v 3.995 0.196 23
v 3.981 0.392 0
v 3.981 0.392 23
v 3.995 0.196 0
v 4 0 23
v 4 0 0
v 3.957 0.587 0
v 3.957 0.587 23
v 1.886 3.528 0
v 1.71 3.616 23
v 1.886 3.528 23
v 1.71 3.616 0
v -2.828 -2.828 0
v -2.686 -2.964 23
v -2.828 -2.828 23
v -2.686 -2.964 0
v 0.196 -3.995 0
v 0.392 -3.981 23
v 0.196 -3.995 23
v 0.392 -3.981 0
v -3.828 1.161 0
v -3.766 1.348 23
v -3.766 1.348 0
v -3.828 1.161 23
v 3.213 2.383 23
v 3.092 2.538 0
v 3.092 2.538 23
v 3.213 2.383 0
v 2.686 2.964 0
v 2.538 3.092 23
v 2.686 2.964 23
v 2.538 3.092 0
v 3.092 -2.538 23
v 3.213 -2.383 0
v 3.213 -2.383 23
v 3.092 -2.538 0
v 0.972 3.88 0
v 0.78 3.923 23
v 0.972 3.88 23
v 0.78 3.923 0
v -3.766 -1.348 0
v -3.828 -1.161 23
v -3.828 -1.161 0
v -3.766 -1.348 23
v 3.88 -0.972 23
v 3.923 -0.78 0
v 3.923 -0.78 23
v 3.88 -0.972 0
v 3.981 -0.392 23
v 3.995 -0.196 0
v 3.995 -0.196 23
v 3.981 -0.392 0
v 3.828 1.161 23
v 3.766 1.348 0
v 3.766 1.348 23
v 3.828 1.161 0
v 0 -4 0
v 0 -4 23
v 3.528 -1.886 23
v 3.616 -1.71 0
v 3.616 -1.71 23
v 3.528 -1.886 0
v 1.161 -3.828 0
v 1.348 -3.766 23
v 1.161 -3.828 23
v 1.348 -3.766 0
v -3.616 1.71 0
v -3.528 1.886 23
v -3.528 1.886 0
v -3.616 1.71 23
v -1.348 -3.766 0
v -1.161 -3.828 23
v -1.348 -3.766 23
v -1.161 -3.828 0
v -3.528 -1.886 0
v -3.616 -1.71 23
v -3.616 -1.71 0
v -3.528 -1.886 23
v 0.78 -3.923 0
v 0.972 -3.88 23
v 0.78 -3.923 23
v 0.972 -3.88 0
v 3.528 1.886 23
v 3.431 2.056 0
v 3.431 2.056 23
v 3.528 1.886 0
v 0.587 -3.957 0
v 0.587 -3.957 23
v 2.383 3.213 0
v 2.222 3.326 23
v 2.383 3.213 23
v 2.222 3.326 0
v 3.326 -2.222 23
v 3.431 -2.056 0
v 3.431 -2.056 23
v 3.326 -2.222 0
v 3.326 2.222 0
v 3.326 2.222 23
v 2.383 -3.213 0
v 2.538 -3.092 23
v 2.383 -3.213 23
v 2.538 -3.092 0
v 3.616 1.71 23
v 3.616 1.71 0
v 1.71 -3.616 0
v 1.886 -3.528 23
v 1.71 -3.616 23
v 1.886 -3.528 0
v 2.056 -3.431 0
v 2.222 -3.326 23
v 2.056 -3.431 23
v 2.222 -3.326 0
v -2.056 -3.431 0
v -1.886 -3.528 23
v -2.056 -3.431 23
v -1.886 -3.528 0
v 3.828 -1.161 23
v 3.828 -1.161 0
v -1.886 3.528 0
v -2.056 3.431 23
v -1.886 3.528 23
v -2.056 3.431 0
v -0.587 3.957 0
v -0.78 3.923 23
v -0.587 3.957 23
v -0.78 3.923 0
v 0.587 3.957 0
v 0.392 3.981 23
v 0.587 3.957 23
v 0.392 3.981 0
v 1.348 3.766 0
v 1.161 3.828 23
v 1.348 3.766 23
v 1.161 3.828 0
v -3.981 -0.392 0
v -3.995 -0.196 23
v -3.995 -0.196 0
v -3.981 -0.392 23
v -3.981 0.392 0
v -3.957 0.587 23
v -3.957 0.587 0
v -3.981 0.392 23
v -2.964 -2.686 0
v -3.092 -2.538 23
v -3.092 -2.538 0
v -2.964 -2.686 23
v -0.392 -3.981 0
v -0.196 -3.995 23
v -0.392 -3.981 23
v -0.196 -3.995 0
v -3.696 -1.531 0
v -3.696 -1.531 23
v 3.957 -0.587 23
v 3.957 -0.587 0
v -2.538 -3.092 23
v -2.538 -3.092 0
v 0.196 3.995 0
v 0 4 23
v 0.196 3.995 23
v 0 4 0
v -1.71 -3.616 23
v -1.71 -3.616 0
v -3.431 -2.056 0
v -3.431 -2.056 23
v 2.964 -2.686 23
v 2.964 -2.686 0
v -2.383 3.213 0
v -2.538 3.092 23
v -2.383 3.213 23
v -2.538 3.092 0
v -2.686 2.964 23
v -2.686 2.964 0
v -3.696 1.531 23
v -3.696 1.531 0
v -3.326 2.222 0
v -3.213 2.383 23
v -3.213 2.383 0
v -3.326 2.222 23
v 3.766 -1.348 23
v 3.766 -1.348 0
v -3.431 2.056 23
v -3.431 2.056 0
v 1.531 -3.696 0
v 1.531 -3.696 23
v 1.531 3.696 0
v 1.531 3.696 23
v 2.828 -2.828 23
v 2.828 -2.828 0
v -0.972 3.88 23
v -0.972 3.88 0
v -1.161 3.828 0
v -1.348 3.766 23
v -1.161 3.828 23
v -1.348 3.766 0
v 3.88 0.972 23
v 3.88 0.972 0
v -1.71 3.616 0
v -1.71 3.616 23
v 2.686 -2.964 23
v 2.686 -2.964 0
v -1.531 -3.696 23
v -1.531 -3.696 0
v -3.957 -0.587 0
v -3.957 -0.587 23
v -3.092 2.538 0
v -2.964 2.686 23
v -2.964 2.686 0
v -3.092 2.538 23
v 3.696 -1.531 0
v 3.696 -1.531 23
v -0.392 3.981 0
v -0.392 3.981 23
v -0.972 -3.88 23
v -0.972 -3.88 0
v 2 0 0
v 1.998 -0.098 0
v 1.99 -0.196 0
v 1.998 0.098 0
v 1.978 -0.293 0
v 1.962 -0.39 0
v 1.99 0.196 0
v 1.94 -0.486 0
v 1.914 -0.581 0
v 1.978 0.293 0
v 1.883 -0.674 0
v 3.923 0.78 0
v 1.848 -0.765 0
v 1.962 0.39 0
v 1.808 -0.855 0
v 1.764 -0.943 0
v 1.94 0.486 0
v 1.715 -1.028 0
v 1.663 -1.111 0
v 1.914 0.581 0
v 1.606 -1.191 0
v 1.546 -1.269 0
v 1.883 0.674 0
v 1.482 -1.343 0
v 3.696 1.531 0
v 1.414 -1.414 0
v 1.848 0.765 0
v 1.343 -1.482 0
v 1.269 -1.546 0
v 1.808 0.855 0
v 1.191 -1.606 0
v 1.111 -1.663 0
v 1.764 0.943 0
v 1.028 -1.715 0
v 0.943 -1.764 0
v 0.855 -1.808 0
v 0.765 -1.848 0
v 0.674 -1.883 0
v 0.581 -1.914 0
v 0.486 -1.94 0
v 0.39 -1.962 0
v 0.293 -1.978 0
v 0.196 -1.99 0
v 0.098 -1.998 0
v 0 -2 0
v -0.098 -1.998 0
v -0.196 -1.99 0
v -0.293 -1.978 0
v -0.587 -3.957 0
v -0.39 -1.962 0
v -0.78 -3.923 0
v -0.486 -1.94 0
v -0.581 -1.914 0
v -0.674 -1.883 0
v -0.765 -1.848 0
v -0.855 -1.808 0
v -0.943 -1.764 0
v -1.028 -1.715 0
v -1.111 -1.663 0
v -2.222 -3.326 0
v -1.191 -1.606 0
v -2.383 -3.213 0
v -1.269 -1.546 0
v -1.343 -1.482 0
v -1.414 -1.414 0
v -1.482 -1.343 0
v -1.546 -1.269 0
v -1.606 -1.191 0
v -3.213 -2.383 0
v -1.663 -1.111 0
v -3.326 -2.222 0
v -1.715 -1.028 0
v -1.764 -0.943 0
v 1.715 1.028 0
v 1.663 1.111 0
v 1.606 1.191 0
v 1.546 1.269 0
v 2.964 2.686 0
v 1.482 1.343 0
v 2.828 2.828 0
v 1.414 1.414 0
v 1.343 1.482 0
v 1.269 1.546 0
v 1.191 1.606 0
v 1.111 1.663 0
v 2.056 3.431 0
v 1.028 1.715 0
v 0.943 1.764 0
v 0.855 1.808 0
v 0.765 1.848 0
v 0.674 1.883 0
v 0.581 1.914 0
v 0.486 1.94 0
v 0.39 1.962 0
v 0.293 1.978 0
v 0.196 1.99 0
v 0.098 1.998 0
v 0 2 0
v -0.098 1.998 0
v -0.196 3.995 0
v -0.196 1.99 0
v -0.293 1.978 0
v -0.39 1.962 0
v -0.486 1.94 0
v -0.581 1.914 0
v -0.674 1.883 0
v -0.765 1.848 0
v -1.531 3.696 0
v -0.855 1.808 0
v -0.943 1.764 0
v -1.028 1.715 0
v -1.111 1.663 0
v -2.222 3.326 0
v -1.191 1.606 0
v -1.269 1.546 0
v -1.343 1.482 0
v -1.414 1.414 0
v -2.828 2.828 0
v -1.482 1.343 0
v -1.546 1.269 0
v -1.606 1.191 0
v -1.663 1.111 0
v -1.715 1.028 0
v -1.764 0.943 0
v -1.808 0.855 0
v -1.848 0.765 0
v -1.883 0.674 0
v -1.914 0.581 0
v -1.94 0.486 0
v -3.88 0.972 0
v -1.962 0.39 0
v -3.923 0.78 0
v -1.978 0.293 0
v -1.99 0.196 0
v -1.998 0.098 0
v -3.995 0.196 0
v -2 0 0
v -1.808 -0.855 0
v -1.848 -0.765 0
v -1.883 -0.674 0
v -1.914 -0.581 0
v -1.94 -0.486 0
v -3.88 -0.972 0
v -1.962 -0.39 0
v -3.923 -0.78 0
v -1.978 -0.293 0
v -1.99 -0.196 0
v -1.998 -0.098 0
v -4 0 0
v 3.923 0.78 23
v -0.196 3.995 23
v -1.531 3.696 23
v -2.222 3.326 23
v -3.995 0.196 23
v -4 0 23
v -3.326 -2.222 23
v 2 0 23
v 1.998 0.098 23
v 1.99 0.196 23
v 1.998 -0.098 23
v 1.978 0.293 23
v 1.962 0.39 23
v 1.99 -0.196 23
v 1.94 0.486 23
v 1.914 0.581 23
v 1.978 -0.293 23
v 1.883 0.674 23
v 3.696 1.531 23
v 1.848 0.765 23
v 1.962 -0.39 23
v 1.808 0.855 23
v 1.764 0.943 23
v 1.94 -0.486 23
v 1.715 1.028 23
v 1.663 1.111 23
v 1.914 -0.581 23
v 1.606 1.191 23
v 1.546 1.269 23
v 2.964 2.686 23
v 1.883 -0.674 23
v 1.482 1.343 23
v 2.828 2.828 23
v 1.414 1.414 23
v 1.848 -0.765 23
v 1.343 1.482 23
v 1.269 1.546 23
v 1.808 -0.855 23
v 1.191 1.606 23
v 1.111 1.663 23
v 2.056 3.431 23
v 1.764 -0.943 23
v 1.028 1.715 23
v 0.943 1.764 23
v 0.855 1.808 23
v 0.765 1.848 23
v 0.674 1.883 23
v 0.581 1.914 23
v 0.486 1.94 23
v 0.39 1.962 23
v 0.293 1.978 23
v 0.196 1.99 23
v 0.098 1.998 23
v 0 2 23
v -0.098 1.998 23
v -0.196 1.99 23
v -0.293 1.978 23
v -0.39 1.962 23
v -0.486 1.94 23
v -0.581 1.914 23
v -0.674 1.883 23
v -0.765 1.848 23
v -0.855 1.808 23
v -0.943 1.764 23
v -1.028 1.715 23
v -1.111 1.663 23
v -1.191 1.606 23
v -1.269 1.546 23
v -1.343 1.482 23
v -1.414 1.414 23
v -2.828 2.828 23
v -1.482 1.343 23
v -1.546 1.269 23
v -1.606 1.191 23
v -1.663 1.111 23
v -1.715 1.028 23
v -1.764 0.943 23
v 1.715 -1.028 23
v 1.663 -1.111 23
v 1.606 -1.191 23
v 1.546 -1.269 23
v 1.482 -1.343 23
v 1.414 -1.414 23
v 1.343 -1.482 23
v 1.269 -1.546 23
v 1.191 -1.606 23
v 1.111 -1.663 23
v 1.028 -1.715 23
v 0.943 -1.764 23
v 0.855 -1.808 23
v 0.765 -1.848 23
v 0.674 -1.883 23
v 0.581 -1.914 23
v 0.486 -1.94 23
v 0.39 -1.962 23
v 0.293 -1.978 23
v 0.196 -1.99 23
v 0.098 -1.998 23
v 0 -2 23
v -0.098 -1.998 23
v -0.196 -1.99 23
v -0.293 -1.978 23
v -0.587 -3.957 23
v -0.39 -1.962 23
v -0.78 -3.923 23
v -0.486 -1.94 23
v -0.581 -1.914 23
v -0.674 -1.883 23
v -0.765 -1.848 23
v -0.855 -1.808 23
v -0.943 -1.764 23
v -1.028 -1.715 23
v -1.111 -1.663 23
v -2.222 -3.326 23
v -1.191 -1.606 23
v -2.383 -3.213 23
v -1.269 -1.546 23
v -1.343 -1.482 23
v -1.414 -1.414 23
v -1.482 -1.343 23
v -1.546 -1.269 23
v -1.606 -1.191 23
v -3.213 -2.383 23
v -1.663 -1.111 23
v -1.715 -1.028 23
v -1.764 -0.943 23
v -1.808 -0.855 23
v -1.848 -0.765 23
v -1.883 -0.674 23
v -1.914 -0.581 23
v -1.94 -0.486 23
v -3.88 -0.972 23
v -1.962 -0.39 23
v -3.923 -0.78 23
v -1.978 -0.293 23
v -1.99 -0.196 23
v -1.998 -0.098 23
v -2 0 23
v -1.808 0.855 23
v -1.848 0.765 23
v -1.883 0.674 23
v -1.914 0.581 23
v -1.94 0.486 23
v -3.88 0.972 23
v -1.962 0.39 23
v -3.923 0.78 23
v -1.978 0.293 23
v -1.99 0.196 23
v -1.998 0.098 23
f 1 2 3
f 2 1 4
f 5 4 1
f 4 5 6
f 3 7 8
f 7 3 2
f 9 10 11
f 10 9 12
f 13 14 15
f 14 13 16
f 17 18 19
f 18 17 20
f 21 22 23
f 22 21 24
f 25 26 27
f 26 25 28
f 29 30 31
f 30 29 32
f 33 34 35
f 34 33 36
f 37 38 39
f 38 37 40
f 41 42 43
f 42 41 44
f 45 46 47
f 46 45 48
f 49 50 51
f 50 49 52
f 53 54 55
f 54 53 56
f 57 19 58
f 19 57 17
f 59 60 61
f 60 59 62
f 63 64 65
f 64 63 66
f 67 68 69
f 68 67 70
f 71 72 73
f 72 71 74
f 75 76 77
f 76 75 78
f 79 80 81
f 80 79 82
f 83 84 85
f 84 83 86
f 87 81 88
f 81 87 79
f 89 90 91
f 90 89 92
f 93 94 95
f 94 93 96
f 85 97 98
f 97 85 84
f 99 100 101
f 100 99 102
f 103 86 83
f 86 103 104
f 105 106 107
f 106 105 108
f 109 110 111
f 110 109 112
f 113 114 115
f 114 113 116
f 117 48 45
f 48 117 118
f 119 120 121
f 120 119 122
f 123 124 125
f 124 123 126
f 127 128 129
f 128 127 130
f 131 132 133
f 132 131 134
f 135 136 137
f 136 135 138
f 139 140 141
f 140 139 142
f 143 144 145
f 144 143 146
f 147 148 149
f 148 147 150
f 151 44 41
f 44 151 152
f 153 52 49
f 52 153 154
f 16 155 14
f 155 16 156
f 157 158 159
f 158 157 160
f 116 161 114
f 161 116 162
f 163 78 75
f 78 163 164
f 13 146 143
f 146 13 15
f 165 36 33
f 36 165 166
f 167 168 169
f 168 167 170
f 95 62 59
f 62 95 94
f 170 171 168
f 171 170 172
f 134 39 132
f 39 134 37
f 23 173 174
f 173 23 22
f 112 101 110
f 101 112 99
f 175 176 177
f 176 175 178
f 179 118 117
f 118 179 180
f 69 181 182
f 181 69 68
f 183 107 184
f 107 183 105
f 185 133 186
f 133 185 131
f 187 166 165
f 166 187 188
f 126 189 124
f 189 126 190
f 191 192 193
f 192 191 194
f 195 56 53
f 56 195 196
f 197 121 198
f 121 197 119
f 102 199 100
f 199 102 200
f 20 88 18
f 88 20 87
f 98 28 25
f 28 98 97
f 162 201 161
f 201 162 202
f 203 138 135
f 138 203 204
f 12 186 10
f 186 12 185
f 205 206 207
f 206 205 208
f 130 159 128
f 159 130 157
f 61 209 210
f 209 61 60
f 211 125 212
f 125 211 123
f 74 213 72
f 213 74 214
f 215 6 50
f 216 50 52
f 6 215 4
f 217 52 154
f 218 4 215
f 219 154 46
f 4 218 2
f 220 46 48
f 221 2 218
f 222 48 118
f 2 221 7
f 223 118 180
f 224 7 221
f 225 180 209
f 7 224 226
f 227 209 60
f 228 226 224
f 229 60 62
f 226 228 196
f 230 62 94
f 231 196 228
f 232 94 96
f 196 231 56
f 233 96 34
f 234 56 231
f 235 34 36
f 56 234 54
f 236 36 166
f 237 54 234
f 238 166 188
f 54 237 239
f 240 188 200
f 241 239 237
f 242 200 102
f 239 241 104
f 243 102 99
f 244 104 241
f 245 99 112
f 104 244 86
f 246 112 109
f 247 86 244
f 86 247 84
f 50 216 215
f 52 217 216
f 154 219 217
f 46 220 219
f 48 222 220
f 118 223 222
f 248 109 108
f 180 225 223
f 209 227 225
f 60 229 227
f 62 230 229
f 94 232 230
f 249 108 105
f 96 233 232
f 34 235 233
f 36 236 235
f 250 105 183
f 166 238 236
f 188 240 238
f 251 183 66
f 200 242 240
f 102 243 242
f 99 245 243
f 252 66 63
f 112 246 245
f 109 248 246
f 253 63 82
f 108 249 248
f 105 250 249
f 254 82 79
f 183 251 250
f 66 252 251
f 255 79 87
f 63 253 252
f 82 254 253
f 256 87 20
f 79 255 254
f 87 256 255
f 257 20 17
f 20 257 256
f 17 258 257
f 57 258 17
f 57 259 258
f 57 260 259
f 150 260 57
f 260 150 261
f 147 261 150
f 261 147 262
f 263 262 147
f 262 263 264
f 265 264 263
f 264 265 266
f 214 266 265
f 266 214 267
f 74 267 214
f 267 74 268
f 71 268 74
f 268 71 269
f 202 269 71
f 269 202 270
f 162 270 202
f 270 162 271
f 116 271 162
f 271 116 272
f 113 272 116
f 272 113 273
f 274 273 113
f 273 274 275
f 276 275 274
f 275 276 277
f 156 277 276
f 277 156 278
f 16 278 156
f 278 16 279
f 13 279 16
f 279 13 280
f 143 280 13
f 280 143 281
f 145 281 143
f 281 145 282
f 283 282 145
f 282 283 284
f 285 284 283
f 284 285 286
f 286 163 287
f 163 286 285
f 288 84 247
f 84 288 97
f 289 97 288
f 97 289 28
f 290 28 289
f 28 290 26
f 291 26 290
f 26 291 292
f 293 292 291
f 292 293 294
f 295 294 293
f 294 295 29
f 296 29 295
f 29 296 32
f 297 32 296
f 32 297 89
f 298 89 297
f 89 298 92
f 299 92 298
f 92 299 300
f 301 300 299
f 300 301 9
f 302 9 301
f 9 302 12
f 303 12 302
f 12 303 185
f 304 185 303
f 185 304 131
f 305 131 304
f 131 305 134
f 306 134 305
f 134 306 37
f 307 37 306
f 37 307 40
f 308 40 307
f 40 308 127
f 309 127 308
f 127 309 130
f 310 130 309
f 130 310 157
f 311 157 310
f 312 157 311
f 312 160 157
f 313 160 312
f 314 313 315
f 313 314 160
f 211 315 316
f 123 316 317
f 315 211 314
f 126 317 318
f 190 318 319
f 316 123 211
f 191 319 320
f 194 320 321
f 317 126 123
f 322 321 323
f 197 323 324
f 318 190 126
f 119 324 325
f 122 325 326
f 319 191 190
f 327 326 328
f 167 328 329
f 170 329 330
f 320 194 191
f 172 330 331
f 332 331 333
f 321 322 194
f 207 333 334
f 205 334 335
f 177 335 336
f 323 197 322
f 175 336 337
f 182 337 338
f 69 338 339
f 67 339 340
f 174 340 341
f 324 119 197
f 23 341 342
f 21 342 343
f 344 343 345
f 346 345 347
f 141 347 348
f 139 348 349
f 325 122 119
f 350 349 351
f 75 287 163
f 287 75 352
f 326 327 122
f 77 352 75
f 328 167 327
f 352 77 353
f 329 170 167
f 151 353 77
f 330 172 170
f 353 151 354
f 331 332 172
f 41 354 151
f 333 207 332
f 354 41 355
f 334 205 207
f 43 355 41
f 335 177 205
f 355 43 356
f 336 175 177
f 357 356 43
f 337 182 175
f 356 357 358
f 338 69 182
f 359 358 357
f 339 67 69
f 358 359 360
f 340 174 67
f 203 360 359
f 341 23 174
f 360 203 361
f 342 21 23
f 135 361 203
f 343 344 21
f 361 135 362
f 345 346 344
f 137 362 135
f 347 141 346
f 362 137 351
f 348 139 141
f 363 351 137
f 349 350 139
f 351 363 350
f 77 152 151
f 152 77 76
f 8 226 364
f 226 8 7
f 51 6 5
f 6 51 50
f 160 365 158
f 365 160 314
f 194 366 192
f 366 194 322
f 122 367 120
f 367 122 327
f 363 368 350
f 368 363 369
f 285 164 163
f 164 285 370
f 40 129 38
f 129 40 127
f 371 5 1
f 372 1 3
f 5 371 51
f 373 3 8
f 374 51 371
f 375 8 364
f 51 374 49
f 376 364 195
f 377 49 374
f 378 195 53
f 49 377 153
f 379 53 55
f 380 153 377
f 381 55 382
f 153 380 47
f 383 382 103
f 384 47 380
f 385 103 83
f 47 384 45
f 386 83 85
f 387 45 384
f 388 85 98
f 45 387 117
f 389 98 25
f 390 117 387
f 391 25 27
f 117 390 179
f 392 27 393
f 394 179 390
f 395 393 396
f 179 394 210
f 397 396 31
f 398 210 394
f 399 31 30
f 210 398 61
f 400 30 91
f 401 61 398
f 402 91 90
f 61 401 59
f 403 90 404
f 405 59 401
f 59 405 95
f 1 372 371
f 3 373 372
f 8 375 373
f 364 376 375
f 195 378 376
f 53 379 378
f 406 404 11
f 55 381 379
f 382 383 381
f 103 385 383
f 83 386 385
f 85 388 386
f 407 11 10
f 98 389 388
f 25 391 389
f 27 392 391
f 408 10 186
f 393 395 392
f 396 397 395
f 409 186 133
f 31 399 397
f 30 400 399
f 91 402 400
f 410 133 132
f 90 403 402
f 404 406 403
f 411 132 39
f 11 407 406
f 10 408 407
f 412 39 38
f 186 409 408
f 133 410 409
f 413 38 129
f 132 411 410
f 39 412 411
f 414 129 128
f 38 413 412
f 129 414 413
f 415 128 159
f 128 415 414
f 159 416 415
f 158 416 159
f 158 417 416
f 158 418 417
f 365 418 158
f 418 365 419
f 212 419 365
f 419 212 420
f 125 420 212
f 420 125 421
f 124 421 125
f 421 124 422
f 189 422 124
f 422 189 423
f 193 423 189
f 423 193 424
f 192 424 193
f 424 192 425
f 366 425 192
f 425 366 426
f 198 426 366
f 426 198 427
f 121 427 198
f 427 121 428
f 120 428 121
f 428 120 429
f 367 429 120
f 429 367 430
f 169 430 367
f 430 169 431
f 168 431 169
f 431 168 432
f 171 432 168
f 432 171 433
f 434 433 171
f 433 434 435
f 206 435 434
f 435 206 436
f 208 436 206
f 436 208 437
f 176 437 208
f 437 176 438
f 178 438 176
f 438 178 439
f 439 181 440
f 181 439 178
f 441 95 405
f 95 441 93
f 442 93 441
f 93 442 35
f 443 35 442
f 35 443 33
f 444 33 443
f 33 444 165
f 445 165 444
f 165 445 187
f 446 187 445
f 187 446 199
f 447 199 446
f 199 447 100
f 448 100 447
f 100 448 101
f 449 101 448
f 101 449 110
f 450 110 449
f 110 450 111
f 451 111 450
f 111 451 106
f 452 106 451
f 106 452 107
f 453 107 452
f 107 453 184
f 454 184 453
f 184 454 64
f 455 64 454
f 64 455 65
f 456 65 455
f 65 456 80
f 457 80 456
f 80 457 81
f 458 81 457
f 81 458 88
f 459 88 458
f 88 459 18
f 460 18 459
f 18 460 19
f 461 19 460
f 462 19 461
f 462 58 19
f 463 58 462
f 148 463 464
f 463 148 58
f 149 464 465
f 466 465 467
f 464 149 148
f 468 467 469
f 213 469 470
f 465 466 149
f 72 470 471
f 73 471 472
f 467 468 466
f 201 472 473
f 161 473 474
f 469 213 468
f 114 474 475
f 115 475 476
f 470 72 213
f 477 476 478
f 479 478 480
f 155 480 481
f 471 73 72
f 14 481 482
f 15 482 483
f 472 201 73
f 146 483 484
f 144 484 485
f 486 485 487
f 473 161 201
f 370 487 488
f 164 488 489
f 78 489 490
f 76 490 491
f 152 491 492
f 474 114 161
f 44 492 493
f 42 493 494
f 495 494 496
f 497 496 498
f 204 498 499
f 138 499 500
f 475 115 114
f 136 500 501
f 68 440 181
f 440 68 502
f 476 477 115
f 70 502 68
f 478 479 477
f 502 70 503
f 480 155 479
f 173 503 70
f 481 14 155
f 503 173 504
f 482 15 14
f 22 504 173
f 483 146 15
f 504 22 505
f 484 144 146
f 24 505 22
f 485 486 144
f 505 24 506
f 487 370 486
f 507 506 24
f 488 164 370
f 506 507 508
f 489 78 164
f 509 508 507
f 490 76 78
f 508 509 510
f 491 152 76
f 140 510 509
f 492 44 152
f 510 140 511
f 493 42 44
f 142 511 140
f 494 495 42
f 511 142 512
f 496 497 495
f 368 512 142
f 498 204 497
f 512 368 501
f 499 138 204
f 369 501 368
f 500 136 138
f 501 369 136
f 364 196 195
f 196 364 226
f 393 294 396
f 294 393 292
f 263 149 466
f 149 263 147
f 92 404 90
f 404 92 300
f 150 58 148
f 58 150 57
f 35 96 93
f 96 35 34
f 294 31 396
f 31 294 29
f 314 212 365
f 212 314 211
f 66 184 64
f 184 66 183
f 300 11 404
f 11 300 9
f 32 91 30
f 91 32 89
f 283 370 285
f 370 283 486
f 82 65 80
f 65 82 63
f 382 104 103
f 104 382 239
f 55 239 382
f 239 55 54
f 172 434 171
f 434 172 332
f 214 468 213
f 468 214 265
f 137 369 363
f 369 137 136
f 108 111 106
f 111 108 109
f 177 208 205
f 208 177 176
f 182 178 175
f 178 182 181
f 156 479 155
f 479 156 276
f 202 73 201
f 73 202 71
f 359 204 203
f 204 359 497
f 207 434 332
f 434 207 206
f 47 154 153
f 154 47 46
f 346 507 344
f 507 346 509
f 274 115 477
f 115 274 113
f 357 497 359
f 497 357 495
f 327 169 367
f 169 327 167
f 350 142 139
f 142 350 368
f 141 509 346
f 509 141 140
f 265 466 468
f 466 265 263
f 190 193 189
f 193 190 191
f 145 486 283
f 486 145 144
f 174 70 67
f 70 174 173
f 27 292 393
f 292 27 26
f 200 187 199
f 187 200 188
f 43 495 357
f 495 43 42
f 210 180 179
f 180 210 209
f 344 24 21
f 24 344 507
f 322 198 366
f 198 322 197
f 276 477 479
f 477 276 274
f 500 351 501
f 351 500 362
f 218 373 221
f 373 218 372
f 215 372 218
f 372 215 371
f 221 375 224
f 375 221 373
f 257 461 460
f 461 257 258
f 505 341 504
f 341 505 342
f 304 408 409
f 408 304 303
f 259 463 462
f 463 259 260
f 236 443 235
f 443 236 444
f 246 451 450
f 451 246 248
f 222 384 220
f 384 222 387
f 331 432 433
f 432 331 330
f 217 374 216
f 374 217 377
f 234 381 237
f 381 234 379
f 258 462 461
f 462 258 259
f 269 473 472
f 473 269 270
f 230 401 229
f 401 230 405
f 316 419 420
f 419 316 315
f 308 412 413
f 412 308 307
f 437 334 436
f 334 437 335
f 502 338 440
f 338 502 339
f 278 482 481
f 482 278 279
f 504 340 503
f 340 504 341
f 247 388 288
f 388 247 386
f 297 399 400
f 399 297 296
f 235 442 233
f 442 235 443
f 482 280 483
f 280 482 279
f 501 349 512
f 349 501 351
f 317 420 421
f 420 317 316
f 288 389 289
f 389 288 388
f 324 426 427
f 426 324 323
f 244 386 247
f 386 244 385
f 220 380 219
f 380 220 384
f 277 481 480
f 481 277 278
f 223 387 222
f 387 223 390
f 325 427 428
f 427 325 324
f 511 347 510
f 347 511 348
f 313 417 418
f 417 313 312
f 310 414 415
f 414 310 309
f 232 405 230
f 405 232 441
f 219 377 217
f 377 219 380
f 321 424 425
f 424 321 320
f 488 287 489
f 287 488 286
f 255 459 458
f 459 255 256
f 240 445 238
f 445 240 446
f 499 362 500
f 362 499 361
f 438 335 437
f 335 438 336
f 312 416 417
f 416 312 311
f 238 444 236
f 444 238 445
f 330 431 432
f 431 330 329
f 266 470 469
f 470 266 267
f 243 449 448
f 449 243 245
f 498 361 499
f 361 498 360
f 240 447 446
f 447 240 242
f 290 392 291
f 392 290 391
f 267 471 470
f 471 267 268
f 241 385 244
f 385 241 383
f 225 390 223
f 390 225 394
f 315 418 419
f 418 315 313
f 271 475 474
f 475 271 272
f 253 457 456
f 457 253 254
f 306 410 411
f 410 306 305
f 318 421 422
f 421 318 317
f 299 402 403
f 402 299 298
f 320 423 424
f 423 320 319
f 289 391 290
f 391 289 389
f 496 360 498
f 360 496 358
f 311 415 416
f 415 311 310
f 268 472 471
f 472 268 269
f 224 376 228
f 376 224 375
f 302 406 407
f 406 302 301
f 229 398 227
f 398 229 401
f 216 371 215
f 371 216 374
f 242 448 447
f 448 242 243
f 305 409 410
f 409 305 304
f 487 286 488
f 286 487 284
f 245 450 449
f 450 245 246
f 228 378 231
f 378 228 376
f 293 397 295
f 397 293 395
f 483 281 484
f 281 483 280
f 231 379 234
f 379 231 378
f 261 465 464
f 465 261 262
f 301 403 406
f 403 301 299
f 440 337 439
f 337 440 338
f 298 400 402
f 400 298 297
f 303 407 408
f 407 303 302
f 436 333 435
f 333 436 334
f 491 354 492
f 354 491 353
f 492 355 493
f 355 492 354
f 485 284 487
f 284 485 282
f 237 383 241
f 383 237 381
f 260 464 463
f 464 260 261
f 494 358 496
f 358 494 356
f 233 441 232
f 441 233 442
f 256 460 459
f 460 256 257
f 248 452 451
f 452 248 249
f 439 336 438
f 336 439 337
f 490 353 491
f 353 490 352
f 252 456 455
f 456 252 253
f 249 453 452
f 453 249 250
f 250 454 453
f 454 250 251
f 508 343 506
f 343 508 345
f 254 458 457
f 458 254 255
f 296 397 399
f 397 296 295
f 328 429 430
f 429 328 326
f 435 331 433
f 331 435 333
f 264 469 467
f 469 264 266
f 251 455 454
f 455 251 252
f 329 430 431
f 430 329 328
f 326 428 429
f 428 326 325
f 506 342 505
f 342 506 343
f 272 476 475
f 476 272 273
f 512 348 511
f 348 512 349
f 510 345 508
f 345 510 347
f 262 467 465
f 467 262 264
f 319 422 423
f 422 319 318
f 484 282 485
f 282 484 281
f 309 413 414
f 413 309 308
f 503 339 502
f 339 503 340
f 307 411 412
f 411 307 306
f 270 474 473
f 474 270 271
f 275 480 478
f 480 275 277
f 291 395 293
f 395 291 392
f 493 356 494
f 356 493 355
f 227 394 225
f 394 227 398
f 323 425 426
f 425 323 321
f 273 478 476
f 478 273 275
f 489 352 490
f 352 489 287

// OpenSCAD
$fn = 128;

bore_d = 4.0;
outer_d = 8.0;
length = 23.0;

difference() {
  cylinder(d = outer_d, h = length, center = false);
  translate([0, 0, -0.1])
    cylinder(d = bore_d, h = length + 0.2, center = false);
}
